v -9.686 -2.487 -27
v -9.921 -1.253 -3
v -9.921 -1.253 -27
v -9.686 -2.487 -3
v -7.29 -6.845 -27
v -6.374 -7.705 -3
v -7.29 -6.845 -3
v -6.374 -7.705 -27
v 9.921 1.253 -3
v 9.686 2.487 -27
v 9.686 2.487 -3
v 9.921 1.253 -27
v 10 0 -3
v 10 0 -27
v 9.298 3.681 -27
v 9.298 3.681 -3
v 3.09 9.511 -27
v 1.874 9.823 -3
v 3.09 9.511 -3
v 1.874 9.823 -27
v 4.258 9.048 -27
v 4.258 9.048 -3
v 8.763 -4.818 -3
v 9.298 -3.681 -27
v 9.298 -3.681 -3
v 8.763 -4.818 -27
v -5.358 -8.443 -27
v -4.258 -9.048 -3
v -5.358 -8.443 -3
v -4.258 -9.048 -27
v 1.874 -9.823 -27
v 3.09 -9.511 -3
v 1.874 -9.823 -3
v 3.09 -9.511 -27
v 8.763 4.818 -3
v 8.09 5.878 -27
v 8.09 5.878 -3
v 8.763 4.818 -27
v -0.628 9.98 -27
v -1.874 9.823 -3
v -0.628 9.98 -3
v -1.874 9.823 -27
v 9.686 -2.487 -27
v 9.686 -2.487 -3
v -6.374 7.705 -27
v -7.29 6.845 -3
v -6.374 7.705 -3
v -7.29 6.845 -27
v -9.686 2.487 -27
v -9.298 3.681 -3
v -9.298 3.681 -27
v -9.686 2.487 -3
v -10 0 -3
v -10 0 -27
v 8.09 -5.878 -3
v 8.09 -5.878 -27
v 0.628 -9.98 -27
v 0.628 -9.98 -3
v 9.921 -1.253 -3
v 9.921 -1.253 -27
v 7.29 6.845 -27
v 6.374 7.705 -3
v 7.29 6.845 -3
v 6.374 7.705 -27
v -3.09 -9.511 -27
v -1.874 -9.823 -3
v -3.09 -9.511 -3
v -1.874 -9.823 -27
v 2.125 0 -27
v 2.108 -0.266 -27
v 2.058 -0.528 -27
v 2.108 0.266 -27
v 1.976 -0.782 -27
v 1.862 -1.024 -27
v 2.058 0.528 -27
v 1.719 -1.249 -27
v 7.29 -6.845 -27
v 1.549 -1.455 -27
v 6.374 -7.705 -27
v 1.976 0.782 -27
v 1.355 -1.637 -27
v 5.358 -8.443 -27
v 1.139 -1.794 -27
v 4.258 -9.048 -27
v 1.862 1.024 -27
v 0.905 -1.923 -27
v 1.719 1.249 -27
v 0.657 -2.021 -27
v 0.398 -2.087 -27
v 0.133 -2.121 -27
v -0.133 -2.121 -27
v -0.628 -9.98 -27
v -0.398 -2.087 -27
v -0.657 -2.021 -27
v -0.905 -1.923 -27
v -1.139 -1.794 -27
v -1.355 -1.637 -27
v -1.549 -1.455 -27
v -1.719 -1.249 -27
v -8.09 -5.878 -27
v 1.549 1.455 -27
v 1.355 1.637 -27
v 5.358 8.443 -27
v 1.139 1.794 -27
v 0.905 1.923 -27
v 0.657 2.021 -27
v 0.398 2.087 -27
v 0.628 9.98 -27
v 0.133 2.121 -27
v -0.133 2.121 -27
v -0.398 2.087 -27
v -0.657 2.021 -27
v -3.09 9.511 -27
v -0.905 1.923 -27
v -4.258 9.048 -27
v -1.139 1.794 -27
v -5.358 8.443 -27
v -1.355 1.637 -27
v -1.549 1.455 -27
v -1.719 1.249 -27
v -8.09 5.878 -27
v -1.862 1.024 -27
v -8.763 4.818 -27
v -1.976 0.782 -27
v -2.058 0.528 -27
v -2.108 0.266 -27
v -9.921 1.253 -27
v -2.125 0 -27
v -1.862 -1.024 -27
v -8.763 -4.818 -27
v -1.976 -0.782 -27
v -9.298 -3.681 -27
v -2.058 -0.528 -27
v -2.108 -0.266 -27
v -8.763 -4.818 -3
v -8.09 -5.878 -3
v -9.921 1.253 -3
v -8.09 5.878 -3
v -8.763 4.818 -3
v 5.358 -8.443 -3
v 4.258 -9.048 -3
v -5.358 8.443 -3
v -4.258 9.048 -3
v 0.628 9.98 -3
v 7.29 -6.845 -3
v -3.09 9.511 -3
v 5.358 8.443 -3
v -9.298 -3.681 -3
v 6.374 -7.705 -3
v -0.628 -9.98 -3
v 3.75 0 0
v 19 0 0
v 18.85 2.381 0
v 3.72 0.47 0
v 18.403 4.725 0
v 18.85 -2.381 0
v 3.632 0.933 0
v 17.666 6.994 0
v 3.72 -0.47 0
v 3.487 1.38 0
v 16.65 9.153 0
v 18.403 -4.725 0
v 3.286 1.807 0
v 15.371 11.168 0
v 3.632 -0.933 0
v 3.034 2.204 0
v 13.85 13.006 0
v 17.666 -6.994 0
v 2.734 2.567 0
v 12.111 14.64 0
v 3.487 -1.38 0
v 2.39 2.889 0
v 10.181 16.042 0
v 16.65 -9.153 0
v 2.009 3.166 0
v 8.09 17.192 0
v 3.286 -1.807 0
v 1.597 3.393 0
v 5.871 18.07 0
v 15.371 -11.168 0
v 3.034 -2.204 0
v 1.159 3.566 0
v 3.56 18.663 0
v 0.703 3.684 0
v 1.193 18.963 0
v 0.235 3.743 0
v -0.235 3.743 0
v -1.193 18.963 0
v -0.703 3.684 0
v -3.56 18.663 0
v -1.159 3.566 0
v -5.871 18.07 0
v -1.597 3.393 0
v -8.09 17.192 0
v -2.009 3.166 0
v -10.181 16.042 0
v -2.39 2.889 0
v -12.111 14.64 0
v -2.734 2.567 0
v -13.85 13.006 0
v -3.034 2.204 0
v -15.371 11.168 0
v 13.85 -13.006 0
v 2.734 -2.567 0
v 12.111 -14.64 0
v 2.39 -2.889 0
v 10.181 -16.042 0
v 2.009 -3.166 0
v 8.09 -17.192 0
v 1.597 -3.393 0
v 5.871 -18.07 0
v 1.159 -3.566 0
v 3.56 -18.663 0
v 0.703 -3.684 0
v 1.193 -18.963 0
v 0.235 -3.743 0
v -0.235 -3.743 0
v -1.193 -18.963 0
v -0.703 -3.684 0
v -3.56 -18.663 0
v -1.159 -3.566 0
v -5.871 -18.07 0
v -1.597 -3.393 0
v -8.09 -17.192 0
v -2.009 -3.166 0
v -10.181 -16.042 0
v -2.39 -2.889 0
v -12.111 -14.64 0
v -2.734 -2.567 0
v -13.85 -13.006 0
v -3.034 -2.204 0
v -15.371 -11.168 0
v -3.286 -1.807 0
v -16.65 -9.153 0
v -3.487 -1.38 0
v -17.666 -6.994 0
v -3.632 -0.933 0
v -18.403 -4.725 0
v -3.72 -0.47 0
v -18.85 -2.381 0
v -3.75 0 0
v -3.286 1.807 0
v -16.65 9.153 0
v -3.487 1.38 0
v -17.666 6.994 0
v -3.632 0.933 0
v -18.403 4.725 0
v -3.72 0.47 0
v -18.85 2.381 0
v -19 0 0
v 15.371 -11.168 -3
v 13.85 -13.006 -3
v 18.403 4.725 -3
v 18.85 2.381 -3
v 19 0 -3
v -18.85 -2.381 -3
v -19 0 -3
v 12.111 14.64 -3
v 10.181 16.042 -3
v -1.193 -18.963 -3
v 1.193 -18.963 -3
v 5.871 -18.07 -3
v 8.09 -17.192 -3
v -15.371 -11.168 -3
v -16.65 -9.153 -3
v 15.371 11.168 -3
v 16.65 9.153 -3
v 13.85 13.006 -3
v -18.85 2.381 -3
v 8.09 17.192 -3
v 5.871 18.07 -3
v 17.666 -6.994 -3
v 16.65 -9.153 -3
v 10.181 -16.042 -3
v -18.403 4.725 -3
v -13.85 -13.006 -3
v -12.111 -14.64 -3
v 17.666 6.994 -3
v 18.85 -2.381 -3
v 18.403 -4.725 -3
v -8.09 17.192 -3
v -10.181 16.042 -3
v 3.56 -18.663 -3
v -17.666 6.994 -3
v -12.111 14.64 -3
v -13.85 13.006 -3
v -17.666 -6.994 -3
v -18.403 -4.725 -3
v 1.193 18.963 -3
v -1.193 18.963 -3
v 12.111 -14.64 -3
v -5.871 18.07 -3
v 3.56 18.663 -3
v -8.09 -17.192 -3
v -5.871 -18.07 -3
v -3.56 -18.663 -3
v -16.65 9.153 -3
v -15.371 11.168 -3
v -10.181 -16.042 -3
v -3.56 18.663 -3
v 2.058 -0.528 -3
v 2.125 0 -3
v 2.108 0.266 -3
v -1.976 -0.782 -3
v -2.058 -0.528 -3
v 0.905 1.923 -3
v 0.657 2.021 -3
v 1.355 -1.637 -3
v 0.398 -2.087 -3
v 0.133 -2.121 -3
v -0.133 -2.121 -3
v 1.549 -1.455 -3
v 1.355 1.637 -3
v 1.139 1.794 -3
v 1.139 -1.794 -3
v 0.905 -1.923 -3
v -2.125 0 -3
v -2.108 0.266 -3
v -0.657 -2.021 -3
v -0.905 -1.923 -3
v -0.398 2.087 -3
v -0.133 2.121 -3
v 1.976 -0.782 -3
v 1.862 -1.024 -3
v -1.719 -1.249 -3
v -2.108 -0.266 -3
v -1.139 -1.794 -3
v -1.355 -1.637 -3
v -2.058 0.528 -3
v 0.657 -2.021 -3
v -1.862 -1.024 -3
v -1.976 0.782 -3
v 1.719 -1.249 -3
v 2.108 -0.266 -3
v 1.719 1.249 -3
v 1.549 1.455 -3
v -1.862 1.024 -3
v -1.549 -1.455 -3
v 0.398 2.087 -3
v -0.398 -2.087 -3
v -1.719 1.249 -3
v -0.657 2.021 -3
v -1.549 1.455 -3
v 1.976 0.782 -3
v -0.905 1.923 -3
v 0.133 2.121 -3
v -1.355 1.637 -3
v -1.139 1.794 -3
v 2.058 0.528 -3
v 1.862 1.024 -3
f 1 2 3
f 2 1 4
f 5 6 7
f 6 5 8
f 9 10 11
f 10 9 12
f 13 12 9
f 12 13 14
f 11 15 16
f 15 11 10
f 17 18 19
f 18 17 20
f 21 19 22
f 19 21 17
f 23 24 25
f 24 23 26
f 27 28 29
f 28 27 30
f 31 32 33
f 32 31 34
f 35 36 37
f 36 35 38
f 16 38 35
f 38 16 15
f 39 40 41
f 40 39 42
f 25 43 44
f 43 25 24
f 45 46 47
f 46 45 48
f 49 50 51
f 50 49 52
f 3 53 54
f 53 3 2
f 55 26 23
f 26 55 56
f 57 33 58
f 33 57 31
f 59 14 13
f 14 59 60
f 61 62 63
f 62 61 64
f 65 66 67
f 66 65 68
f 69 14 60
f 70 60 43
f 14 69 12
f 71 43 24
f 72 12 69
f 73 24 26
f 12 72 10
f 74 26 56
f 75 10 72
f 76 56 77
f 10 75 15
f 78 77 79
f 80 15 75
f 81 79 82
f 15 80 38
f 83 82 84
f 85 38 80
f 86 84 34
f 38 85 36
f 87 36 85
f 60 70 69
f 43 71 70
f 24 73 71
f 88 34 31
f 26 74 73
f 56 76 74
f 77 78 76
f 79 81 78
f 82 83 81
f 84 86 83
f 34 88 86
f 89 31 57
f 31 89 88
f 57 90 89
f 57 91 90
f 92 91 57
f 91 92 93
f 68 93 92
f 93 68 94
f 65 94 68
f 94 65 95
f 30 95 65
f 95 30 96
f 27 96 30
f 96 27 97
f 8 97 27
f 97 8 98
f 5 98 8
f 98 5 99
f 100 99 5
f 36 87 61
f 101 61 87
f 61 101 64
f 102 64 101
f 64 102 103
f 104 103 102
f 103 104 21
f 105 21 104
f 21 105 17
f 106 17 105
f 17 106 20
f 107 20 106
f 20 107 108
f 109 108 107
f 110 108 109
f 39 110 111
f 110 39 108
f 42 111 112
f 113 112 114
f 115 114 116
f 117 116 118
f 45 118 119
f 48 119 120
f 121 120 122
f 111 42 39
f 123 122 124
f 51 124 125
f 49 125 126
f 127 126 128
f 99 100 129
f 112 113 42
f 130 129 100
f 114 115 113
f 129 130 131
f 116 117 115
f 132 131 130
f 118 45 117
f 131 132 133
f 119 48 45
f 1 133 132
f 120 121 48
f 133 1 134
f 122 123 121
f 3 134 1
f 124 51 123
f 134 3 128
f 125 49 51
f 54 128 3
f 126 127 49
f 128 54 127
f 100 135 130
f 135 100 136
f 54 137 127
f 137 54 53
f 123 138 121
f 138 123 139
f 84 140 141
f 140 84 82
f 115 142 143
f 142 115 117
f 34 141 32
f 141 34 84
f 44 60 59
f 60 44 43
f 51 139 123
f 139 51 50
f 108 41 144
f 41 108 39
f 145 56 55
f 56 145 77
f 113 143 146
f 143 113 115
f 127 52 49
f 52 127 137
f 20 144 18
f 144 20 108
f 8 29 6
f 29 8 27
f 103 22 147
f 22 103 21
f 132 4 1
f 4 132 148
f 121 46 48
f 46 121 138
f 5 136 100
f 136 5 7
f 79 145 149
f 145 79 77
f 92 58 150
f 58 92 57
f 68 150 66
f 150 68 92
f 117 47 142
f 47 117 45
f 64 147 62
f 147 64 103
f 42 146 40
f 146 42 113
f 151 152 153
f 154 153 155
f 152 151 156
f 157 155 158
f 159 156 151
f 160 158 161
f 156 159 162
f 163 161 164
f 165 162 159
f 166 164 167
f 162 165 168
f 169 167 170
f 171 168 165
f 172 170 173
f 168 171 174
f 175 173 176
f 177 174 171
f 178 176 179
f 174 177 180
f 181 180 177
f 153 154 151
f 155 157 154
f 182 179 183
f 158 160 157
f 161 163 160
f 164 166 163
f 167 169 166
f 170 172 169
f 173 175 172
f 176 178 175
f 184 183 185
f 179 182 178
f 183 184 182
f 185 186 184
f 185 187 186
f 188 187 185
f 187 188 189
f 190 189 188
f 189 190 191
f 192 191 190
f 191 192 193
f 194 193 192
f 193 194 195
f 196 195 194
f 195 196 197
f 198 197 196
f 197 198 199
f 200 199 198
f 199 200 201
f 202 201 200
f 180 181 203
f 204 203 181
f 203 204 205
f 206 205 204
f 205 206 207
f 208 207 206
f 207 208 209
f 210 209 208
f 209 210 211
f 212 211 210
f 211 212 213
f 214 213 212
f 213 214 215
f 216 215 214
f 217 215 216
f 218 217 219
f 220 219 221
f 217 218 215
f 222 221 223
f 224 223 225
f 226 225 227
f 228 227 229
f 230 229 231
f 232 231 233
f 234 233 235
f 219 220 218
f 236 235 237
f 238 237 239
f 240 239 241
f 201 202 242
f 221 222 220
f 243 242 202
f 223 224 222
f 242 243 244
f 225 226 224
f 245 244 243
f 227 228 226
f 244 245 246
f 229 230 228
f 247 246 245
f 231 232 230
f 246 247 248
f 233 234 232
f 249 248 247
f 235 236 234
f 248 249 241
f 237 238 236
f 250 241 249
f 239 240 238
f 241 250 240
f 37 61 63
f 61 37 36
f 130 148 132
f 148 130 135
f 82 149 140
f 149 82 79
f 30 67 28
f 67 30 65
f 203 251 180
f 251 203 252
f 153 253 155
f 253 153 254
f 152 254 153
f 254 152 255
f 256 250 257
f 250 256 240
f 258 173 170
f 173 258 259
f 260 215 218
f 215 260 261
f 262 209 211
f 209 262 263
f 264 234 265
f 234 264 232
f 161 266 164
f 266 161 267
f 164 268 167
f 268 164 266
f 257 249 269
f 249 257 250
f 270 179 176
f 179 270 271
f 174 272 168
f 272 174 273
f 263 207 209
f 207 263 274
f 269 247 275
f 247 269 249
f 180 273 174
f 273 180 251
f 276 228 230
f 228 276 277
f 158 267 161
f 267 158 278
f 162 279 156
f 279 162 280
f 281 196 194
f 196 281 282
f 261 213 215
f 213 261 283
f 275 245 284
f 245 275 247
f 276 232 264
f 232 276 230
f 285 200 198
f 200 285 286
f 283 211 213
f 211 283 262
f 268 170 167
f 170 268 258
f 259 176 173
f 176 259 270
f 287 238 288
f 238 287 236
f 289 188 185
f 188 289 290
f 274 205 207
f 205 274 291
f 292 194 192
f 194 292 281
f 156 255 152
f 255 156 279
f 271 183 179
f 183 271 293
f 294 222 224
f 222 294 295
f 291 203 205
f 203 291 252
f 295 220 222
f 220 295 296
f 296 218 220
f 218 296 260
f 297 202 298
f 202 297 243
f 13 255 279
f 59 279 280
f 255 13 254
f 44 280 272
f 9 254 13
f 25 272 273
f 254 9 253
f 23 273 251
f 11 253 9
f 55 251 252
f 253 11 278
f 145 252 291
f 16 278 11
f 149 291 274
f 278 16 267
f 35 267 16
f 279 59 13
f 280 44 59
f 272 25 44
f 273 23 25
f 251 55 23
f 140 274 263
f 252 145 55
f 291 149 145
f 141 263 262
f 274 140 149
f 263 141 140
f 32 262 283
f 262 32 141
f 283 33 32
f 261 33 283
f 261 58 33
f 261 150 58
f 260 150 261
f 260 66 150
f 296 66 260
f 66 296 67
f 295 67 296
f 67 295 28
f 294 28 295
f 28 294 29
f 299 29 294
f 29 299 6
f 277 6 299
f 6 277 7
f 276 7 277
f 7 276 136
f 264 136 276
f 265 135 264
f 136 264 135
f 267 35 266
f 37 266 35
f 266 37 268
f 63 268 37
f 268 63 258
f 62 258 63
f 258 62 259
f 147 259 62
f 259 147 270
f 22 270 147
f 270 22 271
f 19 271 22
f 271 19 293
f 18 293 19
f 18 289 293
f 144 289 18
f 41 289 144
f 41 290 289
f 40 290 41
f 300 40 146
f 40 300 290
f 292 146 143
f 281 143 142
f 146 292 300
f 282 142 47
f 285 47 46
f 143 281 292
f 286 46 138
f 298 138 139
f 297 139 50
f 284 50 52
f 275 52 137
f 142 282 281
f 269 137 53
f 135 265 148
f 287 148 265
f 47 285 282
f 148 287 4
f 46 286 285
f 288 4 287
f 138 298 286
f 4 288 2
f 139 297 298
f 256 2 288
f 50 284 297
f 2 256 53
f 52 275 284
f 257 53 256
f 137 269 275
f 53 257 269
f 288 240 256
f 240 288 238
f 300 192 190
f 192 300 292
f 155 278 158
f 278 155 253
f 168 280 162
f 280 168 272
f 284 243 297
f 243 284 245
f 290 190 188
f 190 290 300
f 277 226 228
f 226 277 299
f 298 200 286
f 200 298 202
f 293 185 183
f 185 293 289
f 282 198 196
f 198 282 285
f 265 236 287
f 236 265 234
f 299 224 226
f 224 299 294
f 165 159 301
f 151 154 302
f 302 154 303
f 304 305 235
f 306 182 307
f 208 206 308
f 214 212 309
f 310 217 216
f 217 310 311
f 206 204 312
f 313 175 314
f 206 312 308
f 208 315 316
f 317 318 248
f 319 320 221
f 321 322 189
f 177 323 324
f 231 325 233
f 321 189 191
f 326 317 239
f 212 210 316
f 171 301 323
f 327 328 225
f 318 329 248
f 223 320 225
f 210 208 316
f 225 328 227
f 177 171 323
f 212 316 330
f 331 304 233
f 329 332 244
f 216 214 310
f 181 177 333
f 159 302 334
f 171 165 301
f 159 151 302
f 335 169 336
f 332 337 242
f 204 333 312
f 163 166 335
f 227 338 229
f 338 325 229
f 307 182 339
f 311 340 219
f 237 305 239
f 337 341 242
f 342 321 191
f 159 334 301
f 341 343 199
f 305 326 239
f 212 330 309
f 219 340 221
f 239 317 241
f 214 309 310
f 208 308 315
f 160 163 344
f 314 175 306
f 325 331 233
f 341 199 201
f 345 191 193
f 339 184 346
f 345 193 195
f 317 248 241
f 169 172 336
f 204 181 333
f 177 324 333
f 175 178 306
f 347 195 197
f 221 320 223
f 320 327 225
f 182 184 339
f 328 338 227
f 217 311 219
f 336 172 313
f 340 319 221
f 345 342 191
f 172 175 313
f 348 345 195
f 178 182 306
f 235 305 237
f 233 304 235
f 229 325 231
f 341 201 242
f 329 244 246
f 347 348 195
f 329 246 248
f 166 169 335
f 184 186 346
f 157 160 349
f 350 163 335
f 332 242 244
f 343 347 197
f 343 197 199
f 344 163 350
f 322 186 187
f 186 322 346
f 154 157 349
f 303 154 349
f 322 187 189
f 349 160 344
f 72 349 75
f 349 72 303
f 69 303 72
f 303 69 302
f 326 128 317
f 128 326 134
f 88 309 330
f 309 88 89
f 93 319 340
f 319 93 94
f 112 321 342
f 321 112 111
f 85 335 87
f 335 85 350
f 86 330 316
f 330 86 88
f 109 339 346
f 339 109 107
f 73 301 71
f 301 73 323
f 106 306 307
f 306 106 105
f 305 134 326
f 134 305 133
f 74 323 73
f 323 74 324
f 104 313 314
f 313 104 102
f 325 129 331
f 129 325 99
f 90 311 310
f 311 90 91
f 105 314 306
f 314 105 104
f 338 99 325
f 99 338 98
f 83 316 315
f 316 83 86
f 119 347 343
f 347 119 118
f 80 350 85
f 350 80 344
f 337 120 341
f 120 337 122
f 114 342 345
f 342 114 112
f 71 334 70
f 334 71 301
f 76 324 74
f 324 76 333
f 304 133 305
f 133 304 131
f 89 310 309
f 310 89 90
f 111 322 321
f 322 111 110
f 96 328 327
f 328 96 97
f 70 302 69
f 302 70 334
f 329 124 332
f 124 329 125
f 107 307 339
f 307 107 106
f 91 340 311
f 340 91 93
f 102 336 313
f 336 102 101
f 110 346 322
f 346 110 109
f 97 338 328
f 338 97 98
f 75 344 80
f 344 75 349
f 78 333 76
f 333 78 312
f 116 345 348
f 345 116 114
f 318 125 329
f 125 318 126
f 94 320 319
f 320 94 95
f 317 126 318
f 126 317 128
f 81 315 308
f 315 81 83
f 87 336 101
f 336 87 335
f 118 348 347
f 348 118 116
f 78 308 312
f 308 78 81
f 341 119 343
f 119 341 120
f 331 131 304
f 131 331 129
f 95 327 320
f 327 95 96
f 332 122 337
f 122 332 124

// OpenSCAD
$fn = 50;


difference() {
	union() {
		translate(v = [0, 0, -27.0000000000]) {
			cylinder(h = 27, r = 10.0000000000);
		}
		translate(v = [0, 0, -3.0000000000]) {
			cylinder(h = 3, r = 19.0000000000);
		}
	}
	union() {
		translate(v = [0, 0, 0]) {
			rotate(a = [0, 0, 0]) {
				difference() {
					union() {
						#translate(v = [0, 0, -27.0000000000]) {
							cylinder(h = 27, r = 2.0000000000);
						}
						#translate(v = [0, 0, -3]) {
							cylinder(h = 3, r1 = 2.1250000000, r2 = 3.7500000000);
						}
						#translate(v = [0, 0, -27.0000000000]) {
							cylinder(h = 27, r = 2.1250000000);
						}
						#translate(v = [0, 0, -27.0000000000]) {
							cylinder(h = 27, r = 2.0000000000);
						}
					}
					union();
				}
			}
		}
	}
}
